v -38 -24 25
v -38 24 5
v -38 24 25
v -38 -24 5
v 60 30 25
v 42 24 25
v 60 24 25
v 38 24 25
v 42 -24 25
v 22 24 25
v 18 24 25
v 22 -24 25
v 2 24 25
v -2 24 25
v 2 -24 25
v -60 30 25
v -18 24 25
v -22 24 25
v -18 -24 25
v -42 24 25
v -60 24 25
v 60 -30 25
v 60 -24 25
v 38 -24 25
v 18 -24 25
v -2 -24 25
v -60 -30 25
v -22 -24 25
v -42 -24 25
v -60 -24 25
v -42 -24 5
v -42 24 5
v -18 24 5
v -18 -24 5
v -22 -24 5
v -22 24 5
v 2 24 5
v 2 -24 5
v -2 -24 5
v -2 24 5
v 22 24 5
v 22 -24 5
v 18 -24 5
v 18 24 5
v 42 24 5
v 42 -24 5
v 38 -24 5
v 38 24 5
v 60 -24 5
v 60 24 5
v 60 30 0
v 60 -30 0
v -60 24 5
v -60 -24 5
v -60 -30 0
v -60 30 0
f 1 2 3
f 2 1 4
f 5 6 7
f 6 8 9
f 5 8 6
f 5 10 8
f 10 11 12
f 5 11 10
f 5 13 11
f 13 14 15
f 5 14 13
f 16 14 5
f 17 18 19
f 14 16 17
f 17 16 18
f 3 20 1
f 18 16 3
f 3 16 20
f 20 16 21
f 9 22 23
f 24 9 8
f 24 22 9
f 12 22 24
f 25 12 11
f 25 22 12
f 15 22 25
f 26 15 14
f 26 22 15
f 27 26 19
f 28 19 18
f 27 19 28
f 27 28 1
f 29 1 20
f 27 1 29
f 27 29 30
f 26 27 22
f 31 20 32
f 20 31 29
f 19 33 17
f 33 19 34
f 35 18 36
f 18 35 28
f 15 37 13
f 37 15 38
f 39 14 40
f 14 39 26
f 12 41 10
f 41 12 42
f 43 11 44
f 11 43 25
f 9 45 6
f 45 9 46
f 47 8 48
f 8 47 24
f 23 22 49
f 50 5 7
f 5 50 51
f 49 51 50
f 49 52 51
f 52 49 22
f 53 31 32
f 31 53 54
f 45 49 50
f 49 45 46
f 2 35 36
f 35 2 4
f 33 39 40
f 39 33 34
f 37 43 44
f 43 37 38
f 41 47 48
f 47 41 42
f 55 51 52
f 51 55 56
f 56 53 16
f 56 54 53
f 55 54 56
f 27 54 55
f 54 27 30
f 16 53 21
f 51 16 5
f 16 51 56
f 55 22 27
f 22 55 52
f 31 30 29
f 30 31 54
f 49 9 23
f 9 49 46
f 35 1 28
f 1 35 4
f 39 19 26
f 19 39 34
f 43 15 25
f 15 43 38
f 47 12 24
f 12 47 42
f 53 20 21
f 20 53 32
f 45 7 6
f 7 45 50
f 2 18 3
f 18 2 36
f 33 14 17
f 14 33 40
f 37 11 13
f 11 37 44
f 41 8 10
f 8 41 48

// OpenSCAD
$fn = 32;

// ----------------------------------------------------------------------
// Rib frame 120 x 60 x 25
// 5 ribs at 20 mm pitch
// ----------------------------------------------------------------------

// --- parameters (mm) ---
frame = [120, 60, 5];  // base plate size (x, y, z)
rail_w = 6;            // side rail width
ribs = 5;              // number of ribs
rib_t = 4;             // rib thickness
rib_h = 20;            // rib height above the base plate
pitch = 20;            // pitch between rib centres

// --- derived feature positions (mm) ---
span = (ribs - 1) * pitch;          // = 80   distance between the outer ribs
origin_x = -span / 2;               // = -40   X of the first rib
rib_len = frame[1] - 2 * rail_w + 2;  // = 50   rib length, 1 mm into each rail
feature_centers = [
  [origin_x + 0 * pitch, 0],
  [origin_x + 1 * pitch, 0],
  [origin_x + 2 * pitch, 0],
  [origin_x + 3 * pitch, 0],
  [origin_x + 4 * pitch, 0]
];   // rib centre line, drives the rib loop

// base plate, two side rails, then the ribs read straight off feature_centers
union() {
  translate([-frame[0] / 2, -frame[1] / 2, 0]) cube(frame);
  translate([-frame[0] / 2, -frame[1] / 2, 0]) cube([frame[0], rail_w, frame[2] + rib_h]);
  translate([-frame[0] / 2, frame[1] / 2 - rail_w, 0]) cube([frame[0], rail_w, frame[2] + rib_h]);
  for (centre = feature_centers)
    translate([centre[0] - rib_t / 2, centre[1] - rib_len / 2, frame[2] - 1])
      cube([rib_t, rib_len, rib_h + 1]);
}
